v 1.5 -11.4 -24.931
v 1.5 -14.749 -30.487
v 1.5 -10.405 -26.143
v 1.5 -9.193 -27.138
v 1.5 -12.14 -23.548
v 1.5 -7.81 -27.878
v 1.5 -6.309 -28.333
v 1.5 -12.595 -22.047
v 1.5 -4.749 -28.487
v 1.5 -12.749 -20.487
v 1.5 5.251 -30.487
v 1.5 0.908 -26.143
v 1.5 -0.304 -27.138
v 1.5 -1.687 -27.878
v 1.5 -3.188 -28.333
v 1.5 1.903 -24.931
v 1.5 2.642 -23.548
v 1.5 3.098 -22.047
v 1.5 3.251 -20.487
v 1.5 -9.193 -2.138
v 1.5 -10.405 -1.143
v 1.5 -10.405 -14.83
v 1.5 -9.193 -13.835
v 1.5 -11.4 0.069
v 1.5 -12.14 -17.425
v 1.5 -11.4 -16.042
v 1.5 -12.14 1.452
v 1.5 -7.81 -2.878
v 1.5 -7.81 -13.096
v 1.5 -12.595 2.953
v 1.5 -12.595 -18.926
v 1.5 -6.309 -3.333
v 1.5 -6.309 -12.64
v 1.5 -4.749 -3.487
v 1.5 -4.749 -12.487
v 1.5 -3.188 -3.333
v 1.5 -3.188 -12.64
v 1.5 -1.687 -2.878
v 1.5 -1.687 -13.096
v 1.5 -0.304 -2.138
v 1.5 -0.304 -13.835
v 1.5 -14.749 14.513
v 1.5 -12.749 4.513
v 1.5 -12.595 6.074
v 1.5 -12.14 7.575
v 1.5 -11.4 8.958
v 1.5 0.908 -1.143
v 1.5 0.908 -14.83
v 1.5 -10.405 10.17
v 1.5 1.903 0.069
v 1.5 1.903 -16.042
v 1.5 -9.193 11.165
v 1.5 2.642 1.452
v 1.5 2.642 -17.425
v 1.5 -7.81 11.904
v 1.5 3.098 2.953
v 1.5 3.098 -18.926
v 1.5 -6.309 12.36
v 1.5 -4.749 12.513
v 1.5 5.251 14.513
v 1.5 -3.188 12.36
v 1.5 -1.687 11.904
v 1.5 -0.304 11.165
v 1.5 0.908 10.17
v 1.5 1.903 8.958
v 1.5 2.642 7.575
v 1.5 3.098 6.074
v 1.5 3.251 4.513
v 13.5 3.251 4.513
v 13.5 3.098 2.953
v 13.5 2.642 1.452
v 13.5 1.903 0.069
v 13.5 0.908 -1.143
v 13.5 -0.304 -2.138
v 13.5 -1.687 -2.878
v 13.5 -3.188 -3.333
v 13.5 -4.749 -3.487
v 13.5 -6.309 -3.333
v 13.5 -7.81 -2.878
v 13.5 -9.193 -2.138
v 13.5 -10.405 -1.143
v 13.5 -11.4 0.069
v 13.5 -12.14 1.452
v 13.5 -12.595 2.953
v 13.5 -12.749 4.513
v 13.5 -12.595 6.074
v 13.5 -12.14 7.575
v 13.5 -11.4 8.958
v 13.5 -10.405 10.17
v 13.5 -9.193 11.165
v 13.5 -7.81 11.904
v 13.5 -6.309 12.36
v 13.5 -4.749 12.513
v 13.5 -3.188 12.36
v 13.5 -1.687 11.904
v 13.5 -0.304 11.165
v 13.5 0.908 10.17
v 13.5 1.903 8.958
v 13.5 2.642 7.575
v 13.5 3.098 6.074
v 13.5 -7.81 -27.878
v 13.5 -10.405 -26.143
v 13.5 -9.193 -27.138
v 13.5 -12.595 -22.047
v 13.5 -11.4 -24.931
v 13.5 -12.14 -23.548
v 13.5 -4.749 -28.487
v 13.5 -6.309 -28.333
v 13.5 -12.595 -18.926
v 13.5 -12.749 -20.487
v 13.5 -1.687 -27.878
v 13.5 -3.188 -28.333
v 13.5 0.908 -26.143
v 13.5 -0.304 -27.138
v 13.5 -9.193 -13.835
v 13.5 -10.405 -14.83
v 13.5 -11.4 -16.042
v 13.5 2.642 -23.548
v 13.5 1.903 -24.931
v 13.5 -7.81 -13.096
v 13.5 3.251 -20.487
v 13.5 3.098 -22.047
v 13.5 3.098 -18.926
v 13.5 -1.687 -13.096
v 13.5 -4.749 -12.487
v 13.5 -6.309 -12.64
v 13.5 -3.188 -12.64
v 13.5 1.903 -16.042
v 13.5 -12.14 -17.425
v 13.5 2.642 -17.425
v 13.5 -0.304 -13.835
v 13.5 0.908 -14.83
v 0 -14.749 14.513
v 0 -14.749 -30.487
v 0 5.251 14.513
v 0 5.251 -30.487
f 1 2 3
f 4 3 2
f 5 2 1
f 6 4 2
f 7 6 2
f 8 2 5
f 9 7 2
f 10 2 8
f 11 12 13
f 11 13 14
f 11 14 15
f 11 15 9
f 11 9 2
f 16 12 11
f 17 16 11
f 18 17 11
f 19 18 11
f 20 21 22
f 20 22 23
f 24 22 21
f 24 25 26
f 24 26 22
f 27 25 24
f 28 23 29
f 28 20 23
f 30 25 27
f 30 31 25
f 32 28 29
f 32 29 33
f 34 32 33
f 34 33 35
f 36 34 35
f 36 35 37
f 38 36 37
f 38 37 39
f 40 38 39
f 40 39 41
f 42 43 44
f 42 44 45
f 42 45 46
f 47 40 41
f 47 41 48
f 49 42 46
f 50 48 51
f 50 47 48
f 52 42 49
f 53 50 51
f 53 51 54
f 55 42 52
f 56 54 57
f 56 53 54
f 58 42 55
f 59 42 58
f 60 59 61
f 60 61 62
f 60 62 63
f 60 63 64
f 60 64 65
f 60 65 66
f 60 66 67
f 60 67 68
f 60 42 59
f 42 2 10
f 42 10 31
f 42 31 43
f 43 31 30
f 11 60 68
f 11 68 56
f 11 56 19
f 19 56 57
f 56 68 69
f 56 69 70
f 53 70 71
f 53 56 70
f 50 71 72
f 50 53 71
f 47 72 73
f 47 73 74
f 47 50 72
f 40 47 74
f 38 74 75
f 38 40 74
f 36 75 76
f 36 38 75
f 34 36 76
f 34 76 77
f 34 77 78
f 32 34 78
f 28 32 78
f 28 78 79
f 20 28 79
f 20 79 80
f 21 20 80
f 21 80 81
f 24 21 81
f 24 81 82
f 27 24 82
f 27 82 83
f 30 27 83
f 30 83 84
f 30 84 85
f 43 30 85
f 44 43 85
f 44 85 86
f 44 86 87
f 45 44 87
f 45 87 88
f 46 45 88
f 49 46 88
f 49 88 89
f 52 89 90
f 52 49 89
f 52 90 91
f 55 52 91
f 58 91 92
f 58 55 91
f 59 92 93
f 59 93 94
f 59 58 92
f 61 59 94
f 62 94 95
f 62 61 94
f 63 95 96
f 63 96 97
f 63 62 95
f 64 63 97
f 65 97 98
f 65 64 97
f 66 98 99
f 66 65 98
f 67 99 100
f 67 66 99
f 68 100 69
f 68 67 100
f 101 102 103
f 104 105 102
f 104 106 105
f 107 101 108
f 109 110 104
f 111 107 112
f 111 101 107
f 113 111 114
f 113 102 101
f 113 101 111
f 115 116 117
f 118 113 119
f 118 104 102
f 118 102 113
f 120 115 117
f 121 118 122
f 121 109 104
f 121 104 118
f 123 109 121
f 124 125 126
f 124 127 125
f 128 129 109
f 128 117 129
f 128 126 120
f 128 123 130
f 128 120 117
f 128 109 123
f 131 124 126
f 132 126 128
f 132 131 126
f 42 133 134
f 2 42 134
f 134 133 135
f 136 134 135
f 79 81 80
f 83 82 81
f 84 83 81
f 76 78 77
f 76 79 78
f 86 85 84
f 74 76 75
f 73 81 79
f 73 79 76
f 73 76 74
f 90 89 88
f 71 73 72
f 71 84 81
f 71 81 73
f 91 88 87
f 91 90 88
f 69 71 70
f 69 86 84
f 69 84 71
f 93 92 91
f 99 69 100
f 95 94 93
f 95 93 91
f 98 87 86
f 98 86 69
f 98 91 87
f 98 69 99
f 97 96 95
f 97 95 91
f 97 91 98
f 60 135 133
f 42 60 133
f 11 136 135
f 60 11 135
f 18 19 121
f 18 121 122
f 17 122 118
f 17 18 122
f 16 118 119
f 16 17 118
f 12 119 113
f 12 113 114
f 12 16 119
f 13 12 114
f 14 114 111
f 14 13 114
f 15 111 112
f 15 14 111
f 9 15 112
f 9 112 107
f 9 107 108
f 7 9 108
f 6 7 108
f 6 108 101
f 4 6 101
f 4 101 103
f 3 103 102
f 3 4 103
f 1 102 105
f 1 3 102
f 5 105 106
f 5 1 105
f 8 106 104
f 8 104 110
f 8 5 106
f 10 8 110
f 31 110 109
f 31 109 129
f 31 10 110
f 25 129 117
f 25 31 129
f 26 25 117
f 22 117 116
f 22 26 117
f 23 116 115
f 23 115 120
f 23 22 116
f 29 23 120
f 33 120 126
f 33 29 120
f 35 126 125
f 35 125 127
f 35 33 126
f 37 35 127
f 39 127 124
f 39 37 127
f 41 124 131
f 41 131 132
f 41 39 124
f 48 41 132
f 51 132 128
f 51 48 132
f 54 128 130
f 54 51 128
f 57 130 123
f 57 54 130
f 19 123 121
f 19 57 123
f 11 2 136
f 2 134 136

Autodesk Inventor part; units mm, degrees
ref_plane "YZ Plane" through (0, 0, 0) normal (1, 0, 0) x (0, 1, 0)
ref_plane "XZ Plane" through (0, 0, 0) normal (0, 1, 0) x (-1, 0, 0)
ref_plane "XY Plane" through (0, 0, 0) normal (0, 0, 1) x (1, 0, 0)
sketch "Sketch1" plane through (0, 0, 0) normal (1, 0, 0) x (0, 1, 0)
  line L0 (5.2514, 14.5134) -> (-14.7486, 14.5134)
  line L1 (-14.7486, 14.5134) -> (-14.7486, -30.4866)
  line L2 (-14.7486, -30.4866) -> (5.2514, -30.4866)
  line L3 (5.2514, -30.4866) -> (5.2514, 14.5134)
  line L4 (3.2514, 12.5134) -> (-12.7486, 12.5134)
  line L5 (-12.7486, 12.5134) -> (-12.7486, -28.4866)
  line L6 (-12.7486, -28.4866) -> (3.2514, -28.4866)
  line L7 (3.2514, -28.4866) -> (3.2514, 12.5134)
  circle A0 centre (-4.7486, -20.4866) radius 8
  line L8 (3.2514, -7.9866) -> (-3.9727, -7.9866)
  circle A1 centre (-4.7486, 4.5134) radius 8
  point P0 (0, 0)
  dimension "d0" = 20
  dimension "d1" = 45
extrude "Extrusion1" add sketch "Sketch1" along normal blind 1.5 contours L3 L2 L1 L0 | L7 A1 L4 | A1 L5 L4 | A1 | L7 A0 L5 A1 | A0 L6 L5 | A0 | L7 L6 A0
extrude "Extrusion2" add sketch "Sketch1" along normal blind 13.5 contours A1 | A0
properties part number "HCSR04"
